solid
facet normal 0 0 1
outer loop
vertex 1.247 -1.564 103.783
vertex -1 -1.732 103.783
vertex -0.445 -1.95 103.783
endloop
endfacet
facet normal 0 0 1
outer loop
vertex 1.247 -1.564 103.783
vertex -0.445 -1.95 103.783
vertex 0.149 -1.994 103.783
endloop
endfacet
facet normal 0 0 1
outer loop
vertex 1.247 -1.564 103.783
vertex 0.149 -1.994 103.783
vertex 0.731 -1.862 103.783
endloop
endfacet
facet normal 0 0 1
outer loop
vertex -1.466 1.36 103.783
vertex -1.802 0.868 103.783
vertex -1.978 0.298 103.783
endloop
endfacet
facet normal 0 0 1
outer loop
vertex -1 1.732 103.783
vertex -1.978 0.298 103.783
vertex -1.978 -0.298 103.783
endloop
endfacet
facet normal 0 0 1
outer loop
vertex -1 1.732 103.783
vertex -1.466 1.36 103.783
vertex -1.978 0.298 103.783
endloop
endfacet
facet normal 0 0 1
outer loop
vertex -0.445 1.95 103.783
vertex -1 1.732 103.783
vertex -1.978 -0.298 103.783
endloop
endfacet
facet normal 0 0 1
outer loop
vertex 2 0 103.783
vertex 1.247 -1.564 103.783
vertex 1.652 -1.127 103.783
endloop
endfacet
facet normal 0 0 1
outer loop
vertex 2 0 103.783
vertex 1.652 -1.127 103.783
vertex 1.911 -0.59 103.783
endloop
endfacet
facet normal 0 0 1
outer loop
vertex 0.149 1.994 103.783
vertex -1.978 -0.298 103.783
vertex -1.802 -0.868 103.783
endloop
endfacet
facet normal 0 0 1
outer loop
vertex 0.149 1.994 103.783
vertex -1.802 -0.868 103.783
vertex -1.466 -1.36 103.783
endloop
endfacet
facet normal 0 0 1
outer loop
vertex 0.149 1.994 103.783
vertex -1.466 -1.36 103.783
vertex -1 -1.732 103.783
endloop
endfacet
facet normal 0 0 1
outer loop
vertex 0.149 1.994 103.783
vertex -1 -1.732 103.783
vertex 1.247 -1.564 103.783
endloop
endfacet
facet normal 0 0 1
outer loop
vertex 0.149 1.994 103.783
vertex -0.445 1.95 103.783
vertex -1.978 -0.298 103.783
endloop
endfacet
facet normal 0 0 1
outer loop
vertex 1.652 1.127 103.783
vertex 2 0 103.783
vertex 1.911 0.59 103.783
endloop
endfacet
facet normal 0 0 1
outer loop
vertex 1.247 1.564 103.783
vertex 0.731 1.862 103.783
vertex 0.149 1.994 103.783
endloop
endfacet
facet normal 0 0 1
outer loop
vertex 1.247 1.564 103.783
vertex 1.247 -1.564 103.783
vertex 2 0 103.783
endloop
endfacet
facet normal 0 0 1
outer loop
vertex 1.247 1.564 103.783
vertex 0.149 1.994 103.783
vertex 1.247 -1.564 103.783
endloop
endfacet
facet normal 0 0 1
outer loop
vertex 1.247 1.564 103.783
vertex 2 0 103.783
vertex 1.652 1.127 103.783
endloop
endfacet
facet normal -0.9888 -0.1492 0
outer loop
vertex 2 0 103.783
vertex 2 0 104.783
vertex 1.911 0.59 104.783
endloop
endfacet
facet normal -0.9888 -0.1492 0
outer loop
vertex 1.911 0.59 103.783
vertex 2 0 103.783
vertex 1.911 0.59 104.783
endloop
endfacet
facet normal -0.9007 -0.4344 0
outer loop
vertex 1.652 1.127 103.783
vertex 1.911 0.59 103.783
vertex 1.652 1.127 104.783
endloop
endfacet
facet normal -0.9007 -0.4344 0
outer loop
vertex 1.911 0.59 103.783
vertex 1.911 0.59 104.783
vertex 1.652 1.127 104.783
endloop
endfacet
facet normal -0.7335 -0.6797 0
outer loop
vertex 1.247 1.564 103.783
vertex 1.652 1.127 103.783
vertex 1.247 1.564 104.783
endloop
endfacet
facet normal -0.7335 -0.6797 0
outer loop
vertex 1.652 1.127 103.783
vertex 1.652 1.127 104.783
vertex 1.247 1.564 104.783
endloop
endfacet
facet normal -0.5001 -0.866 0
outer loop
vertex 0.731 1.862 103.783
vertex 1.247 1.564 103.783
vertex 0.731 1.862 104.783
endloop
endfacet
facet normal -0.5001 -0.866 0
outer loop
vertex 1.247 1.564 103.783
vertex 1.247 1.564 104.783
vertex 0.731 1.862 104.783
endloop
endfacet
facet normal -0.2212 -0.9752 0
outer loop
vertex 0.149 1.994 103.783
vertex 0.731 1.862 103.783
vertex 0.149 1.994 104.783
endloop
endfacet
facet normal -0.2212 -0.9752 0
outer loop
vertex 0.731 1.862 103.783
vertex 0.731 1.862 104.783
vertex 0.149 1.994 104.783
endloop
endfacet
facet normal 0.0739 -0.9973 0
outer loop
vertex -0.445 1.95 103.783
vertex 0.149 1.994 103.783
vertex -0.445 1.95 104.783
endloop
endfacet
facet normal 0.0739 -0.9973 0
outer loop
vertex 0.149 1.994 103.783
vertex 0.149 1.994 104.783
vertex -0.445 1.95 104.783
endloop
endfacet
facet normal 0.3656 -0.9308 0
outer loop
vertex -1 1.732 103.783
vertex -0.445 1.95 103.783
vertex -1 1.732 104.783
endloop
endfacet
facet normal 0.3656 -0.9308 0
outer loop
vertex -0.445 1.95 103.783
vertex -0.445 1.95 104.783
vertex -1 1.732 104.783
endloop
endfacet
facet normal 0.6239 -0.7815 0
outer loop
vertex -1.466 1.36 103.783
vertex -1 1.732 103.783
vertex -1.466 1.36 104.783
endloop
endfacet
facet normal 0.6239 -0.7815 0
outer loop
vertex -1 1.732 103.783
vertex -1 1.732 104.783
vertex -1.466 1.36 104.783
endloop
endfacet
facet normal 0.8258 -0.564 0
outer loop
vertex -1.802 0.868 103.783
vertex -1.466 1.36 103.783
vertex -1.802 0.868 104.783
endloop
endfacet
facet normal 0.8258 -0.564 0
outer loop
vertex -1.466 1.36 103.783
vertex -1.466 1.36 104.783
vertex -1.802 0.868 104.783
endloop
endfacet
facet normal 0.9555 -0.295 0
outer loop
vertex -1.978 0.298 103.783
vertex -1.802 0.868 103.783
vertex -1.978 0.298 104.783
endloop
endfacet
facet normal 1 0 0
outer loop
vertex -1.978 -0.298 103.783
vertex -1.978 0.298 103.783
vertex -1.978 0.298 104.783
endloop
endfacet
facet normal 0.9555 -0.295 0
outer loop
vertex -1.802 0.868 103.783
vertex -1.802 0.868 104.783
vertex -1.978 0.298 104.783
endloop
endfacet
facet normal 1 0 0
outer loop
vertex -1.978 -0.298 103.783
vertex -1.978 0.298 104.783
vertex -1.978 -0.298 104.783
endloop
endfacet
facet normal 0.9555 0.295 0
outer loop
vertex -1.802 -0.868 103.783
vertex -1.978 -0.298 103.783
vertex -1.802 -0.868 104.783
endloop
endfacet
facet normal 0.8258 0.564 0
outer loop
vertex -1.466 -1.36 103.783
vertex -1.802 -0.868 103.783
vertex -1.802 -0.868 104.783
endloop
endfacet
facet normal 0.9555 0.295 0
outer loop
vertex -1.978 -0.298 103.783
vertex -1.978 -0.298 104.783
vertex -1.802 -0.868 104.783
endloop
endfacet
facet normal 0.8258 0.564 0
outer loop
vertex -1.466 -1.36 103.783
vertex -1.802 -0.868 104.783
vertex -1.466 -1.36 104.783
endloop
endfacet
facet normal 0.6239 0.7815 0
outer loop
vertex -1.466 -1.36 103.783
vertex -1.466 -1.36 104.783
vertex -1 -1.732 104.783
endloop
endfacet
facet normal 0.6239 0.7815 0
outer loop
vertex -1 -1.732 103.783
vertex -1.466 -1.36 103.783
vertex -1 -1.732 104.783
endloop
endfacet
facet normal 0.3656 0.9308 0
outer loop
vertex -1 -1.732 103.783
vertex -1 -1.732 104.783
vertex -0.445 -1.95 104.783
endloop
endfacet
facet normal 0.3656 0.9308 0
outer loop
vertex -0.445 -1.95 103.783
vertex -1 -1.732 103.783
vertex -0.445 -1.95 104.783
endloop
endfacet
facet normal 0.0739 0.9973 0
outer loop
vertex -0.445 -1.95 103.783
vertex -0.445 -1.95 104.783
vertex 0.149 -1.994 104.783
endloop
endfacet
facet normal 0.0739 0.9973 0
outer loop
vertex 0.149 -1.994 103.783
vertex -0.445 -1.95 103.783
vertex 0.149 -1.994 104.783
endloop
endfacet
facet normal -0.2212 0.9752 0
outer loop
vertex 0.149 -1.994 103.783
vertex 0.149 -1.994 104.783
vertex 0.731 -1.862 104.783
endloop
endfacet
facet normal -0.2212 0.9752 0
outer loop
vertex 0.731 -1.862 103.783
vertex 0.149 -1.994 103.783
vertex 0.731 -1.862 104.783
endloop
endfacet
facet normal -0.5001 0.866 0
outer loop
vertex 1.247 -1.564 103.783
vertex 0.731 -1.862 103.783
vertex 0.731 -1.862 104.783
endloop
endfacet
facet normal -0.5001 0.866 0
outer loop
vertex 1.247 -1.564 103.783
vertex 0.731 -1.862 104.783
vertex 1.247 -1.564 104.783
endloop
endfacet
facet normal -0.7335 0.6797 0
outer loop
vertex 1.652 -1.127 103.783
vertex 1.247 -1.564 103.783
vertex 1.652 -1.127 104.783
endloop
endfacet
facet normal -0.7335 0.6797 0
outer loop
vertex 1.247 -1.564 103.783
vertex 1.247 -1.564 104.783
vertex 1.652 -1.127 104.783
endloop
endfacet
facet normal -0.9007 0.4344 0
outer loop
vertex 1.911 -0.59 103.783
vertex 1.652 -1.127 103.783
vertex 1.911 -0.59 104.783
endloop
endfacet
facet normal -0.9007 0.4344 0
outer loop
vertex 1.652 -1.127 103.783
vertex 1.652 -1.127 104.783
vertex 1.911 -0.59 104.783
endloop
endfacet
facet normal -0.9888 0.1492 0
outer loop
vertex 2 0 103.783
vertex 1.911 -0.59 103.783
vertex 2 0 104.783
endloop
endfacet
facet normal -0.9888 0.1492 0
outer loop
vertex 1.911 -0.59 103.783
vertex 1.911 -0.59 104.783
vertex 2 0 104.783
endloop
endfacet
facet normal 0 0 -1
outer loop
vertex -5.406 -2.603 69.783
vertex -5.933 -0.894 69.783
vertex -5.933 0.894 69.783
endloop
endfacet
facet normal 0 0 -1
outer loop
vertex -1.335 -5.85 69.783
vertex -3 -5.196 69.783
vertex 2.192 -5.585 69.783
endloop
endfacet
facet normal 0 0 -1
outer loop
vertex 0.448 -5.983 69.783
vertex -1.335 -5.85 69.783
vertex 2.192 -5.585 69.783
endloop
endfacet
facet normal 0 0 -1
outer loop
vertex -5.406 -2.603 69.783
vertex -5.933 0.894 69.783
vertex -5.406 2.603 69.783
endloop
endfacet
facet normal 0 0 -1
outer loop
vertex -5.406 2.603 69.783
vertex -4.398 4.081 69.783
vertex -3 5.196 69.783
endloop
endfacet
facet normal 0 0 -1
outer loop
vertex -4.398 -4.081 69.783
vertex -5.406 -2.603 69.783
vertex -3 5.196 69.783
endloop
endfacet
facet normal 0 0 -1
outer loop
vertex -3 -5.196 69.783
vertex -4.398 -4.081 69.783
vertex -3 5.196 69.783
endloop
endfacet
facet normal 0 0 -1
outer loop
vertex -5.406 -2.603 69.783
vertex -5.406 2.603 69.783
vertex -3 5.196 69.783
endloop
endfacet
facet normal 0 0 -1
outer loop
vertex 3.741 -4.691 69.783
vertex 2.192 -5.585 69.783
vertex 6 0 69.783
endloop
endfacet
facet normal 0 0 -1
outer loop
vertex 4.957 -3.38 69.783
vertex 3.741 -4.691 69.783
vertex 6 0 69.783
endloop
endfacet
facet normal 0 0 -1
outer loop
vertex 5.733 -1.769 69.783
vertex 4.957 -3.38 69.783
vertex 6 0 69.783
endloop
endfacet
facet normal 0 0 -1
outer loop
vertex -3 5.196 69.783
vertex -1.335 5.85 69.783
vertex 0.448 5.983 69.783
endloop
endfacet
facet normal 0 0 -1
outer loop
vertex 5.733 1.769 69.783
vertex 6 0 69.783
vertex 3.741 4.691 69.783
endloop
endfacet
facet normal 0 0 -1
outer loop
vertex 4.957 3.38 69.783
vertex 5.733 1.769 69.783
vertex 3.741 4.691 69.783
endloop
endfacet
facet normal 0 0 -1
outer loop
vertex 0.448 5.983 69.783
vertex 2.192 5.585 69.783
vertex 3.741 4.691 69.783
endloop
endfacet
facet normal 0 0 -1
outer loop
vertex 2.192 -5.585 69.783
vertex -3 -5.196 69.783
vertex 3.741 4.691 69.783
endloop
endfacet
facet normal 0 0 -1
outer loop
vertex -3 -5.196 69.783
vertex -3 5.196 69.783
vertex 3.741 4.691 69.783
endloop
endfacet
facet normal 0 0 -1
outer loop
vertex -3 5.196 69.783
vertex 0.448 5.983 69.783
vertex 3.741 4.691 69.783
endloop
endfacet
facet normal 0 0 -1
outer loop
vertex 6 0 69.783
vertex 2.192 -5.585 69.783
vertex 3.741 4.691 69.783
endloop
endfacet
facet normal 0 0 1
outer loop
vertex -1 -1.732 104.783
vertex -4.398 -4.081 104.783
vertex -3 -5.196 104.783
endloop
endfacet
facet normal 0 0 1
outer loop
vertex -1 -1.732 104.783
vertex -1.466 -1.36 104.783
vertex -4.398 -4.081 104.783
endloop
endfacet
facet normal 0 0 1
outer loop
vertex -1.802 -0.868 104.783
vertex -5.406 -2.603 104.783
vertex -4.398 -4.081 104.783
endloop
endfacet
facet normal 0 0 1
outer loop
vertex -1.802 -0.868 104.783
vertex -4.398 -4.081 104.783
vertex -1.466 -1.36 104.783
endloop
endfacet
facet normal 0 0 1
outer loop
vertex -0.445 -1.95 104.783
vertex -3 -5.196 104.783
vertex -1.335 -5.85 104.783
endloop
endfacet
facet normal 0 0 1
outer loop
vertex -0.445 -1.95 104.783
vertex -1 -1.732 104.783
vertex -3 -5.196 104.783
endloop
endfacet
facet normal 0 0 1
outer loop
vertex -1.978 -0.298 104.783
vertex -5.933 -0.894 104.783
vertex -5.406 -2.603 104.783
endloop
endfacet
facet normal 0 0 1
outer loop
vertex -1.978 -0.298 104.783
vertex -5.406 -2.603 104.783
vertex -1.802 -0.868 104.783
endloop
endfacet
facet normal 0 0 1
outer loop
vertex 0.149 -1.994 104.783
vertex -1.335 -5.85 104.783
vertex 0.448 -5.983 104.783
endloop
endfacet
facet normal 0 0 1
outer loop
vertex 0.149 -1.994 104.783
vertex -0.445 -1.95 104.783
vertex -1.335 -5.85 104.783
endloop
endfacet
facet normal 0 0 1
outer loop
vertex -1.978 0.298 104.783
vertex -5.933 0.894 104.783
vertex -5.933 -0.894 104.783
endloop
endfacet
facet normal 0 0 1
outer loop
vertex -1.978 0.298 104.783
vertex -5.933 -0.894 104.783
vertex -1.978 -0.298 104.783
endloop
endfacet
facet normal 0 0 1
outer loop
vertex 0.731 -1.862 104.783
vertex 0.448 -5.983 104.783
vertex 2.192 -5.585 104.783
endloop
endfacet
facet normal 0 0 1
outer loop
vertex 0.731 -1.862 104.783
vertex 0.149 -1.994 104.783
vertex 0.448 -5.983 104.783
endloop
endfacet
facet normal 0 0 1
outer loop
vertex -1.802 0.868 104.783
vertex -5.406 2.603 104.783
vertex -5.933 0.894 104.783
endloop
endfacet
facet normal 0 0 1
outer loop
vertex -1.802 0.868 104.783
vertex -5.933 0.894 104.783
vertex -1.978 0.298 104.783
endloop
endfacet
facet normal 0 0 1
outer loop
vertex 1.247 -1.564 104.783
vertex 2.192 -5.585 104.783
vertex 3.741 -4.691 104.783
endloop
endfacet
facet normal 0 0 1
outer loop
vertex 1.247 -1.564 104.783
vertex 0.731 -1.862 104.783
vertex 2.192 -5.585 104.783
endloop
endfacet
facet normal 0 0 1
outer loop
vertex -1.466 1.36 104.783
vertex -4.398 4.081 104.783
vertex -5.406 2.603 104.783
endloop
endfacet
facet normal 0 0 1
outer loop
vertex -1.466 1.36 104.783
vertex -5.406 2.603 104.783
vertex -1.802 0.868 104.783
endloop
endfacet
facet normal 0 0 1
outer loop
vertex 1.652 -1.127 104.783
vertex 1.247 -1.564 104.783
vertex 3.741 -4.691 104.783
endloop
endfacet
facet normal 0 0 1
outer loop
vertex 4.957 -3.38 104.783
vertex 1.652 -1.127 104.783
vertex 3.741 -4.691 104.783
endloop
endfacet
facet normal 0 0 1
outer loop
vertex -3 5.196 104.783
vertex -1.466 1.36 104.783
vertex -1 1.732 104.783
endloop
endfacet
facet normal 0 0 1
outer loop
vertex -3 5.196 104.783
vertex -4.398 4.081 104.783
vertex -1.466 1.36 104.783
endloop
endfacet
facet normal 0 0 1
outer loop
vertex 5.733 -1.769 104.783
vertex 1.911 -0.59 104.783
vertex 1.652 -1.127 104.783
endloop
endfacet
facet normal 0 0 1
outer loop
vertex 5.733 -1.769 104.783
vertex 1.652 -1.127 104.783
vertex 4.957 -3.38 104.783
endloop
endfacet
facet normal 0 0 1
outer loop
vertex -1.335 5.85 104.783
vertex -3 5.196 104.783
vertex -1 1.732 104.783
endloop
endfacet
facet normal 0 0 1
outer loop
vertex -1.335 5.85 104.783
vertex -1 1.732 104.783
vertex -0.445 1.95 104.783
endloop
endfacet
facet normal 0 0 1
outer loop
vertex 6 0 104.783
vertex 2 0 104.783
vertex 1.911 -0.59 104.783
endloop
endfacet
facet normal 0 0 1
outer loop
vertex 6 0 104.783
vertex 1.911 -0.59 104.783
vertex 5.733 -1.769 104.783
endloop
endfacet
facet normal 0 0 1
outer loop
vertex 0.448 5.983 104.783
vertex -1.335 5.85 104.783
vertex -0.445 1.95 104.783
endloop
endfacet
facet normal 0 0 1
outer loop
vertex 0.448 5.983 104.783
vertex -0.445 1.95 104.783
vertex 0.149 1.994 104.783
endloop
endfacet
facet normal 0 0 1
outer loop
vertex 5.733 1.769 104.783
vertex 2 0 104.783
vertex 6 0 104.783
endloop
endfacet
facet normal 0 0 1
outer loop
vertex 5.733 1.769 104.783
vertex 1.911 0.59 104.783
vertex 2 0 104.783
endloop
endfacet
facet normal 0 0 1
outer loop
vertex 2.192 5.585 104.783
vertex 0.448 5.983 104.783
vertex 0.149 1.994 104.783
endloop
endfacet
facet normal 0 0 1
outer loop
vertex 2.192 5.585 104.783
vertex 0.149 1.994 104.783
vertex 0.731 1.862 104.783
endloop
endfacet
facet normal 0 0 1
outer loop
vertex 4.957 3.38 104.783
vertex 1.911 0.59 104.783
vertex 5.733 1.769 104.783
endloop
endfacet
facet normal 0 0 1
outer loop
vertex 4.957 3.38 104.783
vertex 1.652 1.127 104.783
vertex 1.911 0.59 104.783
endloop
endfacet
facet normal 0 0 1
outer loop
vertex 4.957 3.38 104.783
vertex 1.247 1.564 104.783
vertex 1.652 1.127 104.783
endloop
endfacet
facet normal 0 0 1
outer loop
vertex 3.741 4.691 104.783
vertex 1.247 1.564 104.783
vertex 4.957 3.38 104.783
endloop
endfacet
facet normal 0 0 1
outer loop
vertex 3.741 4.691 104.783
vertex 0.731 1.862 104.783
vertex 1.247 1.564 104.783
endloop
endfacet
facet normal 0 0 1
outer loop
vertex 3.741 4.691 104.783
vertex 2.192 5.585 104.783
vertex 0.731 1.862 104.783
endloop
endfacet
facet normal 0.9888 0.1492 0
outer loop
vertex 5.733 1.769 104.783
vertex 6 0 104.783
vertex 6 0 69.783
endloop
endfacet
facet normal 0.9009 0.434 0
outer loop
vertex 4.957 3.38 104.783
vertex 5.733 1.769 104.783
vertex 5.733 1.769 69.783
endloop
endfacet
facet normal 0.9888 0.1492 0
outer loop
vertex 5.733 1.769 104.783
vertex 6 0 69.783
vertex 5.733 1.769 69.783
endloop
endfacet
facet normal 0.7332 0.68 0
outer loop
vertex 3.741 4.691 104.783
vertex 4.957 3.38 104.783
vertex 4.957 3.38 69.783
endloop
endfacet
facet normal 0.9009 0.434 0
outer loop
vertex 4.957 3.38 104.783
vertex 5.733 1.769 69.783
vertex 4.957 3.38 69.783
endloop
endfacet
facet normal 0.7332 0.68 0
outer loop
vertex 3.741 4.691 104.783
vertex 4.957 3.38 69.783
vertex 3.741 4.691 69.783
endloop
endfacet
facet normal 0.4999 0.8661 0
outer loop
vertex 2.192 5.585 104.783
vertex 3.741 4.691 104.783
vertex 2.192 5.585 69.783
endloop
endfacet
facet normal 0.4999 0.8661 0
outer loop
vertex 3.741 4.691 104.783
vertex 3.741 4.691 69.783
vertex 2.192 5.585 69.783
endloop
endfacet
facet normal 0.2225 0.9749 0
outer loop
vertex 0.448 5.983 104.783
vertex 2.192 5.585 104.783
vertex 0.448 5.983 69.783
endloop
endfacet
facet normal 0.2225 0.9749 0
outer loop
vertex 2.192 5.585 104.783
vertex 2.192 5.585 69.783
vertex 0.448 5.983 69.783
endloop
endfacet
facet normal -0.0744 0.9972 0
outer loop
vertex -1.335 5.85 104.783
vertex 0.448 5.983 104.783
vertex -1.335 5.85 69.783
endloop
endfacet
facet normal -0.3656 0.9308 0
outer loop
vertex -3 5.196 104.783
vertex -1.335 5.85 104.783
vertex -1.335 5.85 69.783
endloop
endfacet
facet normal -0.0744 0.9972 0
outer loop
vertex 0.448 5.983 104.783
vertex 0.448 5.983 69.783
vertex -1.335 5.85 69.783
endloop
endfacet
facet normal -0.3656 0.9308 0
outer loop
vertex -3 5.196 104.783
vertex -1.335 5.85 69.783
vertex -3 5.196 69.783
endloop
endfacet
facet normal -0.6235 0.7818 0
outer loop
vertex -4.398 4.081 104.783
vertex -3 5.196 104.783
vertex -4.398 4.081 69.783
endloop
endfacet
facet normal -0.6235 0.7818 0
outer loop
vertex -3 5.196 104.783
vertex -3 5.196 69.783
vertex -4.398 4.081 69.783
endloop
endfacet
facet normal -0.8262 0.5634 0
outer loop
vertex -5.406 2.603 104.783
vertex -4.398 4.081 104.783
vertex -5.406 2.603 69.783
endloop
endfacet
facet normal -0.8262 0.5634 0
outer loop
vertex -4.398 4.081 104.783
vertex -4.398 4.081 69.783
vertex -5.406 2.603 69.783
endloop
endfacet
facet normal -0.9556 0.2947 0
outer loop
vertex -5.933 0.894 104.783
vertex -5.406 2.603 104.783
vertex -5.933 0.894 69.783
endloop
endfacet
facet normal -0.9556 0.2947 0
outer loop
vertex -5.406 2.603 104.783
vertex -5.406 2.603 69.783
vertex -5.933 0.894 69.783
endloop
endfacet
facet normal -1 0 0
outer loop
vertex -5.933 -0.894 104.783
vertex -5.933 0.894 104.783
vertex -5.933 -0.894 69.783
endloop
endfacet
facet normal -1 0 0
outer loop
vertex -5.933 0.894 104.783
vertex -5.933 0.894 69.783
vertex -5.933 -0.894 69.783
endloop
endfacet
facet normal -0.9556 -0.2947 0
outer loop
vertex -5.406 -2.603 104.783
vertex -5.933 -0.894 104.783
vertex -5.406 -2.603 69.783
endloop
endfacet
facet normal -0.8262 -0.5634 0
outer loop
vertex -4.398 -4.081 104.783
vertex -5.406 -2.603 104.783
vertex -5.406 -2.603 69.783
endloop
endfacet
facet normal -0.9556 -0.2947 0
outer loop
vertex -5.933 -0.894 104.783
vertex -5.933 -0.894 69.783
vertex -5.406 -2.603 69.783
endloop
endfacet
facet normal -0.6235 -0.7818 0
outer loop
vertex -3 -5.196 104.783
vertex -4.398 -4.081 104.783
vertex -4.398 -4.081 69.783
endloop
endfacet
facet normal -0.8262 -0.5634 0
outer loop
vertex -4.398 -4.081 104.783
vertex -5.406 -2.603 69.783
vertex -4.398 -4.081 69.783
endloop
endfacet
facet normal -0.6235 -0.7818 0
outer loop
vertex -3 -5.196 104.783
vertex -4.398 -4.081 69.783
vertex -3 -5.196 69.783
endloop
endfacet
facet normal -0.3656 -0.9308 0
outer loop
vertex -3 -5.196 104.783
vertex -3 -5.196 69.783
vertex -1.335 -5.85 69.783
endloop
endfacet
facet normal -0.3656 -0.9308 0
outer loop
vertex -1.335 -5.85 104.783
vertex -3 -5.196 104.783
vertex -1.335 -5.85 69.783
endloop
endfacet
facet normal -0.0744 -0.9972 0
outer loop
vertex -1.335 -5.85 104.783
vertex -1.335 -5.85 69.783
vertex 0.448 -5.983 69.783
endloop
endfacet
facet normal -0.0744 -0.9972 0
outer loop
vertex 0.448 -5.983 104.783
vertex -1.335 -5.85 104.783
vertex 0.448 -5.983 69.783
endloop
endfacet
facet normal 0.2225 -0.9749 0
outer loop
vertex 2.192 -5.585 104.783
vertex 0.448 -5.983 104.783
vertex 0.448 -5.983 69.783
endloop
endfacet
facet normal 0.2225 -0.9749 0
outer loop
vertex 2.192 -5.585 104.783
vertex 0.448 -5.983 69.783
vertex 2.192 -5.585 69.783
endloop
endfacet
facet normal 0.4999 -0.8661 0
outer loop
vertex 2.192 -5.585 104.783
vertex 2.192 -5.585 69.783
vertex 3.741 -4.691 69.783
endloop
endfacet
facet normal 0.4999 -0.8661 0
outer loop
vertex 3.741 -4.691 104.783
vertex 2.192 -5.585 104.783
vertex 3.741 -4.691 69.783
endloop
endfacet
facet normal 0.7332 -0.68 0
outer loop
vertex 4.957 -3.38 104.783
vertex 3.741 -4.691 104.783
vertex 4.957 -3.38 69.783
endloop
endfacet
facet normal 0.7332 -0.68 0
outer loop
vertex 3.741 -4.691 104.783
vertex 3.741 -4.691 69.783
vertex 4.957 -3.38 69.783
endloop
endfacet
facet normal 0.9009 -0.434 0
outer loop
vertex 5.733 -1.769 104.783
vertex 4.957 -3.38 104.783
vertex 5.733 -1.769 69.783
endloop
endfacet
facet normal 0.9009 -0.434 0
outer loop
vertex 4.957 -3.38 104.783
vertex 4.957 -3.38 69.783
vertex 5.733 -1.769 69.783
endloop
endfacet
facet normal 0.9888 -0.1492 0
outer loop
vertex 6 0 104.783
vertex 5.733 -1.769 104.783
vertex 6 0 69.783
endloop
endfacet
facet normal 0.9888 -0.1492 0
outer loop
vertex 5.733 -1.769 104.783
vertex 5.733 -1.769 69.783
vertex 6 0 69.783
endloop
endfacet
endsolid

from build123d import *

# Parameters (mm, degrees)
IZIM1_R                     = 30
Y_KSEKLIK_EKSTR_ZYON1_DEPTH = 175
IZIM5_R                     = 10
KES_EKSTR_ZYON1_DEPTH       = 5
L_EK1_SCALE                 = 0.2


with BuildPart() as part:
    # Çizim1 → Yükseklik-Ekstrüzyon1 (new body)
    with BuildSketch(Plane.XY):
        Circle(IZIM1_R)
    extrude(amount=Y_KSEKLIK_EKSTR_ZYON1_DEPTH)

    # Çizim5 → Kes-Ekstrüzyon1 (cut)
    with BuildSketch(Plane.XY.offset(175)):
        Circle(IZIM5_R)
    extrude(amount=-KES_EKSTR_ZYON1_DEPTH, mode=Mode.SUBTRACT)


with BuildPart() as part_1:
    # Ölçek1: scaled about (0, 0, 87.229299363)
    add(part.part.scale(L_EK1_SCALE).moved(Location((0, 0, 69.78343949))))


solid = part_1.part
